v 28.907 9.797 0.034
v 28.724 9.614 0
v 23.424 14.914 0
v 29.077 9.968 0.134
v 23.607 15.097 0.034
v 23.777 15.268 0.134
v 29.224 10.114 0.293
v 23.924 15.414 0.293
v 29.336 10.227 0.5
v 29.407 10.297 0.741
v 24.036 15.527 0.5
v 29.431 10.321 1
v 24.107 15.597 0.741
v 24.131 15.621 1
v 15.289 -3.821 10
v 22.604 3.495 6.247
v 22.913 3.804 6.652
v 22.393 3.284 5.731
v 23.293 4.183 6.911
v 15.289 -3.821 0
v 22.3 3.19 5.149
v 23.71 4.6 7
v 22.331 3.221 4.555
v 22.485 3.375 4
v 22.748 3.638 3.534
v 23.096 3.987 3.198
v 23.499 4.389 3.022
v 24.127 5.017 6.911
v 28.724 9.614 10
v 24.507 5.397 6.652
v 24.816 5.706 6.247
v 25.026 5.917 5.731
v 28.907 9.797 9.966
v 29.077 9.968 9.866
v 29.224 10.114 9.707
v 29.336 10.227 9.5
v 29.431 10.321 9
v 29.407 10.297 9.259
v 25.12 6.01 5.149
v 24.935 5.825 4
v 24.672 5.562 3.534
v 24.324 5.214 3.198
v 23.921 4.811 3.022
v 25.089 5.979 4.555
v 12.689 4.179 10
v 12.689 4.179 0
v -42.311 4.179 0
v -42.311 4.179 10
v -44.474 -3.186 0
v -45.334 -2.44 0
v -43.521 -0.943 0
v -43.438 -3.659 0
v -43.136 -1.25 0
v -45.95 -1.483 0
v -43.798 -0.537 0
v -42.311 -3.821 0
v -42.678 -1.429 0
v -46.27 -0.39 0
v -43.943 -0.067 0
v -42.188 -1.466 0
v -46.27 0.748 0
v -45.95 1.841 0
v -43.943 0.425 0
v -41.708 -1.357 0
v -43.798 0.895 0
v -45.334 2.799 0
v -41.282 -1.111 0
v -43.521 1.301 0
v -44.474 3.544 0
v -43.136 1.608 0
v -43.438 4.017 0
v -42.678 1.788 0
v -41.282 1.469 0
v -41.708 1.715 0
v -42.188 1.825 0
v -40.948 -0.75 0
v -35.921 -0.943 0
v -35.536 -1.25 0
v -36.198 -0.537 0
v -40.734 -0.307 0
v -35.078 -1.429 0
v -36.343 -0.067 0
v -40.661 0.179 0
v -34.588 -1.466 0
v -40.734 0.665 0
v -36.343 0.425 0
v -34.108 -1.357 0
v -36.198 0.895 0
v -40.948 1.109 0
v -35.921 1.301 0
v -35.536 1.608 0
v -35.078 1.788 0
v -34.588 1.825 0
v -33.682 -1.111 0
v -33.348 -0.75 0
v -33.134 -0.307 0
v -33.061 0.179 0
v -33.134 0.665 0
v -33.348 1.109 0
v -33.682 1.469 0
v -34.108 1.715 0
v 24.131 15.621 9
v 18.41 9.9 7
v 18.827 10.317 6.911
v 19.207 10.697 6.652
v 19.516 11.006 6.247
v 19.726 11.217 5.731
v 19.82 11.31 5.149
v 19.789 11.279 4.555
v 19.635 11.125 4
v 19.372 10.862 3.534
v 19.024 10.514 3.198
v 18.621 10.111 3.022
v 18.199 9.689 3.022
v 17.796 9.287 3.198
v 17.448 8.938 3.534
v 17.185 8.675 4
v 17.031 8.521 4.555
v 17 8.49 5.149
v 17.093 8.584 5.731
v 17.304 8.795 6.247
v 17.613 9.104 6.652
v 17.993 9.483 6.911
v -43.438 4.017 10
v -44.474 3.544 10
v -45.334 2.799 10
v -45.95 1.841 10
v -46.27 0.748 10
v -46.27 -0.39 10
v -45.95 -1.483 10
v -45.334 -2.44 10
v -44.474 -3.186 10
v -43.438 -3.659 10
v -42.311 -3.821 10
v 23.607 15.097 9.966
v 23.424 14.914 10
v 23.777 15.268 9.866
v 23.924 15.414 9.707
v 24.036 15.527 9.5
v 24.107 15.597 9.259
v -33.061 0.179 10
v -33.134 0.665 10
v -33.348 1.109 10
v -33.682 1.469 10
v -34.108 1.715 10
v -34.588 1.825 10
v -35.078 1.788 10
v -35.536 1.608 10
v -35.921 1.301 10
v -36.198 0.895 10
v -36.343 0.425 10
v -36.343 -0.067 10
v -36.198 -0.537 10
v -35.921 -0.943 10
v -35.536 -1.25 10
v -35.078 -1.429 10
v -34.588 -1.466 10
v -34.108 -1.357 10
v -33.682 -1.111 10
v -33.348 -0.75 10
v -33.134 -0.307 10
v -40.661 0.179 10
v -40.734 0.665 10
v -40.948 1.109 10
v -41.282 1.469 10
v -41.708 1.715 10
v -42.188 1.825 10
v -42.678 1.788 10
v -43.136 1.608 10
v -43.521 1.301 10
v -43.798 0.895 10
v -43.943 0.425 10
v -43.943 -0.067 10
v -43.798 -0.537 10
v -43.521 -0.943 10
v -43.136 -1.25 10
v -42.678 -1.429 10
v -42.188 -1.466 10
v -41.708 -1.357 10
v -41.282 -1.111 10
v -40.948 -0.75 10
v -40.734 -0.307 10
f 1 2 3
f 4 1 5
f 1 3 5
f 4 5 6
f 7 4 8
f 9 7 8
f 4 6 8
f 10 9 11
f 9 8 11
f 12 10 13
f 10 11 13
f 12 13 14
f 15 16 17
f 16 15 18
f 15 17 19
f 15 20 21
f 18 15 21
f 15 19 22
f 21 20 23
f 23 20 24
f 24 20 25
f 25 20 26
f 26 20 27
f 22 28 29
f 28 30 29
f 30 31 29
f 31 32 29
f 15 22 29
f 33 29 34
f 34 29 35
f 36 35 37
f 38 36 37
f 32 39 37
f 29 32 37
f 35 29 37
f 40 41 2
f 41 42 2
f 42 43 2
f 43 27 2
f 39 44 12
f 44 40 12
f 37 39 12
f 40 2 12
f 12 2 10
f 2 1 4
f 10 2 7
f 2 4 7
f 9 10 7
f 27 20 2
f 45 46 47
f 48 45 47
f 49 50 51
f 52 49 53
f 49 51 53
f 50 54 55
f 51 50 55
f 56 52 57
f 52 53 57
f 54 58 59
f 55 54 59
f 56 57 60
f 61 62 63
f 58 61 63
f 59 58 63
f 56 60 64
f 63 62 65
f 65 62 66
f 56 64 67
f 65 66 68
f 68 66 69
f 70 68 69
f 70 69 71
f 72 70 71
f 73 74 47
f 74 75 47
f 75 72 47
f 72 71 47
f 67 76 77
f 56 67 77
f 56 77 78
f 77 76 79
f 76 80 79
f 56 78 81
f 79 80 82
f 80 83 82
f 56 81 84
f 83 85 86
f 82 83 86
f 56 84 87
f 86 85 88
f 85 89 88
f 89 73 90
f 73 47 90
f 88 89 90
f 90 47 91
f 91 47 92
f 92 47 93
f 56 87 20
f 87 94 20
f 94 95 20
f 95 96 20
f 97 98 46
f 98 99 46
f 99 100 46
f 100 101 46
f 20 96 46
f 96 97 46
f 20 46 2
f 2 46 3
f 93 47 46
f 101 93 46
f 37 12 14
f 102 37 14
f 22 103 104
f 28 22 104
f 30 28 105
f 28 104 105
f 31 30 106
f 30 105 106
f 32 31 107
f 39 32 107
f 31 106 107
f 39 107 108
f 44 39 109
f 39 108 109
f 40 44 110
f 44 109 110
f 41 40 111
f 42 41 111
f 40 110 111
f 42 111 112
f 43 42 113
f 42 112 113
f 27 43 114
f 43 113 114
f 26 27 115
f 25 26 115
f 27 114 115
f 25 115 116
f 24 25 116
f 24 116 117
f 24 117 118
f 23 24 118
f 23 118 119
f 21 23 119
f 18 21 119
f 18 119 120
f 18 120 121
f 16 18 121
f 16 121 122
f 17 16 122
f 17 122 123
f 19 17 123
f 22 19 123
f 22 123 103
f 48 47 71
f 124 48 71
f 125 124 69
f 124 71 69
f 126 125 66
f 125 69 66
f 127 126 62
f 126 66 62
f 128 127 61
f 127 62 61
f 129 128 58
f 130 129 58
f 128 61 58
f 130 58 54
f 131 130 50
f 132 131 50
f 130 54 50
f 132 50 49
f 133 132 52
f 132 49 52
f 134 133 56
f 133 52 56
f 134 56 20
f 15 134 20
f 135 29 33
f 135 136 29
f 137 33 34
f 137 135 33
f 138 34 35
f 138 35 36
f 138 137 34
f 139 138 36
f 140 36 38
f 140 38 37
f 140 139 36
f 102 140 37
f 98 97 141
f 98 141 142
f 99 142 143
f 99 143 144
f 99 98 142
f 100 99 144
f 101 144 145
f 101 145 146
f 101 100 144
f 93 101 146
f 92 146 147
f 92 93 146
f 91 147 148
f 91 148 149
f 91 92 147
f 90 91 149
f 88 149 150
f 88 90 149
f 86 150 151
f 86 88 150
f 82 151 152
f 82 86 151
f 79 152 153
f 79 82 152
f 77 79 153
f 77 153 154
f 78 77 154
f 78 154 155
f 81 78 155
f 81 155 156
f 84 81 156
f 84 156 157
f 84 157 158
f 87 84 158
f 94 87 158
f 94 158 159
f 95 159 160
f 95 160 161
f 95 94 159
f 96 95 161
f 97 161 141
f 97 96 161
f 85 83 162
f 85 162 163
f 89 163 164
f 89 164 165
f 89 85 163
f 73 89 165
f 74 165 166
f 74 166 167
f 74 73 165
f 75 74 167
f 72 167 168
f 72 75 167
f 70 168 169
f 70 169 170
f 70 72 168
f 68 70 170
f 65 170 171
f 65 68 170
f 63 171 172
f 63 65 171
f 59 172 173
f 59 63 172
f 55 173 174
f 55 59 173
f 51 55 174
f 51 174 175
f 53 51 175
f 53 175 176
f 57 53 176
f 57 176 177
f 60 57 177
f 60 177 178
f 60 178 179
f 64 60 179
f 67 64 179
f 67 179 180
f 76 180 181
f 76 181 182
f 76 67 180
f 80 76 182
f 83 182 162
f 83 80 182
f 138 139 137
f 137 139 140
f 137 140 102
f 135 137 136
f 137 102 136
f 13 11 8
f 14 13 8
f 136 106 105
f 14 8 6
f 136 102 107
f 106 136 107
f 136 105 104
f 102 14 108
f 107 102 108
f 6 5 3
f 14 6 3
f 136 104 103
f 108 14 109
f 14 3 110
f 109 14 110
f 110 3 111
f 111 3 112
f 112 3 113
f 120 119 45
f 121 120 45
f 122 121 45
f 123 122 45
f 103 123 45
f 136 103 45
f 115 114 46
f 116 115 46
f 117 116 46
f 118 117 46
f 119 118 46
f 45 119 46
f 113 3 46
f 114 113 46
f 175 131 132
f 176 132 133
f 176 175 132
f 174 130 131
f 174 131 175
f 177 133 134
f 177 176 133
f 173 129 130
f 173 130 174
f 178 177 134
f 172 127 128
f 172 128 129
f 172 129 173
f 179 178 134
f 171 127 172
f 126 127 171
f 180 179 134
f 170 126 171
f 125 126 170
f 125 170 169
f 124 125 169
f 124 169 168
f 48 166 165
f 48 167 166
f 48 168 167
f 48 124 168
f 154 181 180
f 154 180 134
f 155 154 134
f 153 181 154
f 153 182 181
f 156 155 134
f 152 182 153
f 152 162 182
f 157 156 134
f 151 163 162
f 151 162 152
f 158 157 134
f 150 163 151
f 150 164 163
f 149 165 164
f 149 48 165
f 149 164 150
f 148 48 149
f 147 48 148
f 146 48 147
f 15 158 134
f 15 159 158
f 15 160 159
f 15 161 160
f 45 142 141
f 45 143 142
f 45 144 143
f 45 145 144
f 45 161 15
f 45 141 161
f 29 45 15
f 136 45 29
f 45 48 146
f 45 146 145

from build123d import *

# Parameters (mm, degrees)
SKETCH1_R           = 1.65
BOSS_EXTRUDE1_DEPTH = 10
SKETCH2_R           = 2
CUT_EXTRUDE1_DEPTH  = 18.495331881
FILLET1_R           = 1


with BuildPart() as part:
    # Sketch1 → Boss-Extrude1 (new body)
    with BuildSketch(Plane.XY):
        with BuildLine():
            Line((12.688854384, 4.179140788), (-42.311145616, 4.179140788))
            ThreePointArc((-42.311145616, 4.179140788), (-46.311145616, 0.179140788), (-42.311145616, -3.820859212))
            Line((-42.311145616, -3.820859212), (15.288854384, -3.820859212))
            Line((15.288854384, -3.820859212), (29.430990008, 10.321276412))
            Line((29.430990008, 10.321276412), (24.130990008, 15.621276412))
            Line((24.130990008, 15.621276412), (12.688854384, 4.179140788))
        make_face()
        with Locations((-34.711145616, 0.179140788)):
            Circle(SKETCH1_R, mode=Mode.SUBTRACT)
        with Locations((-42.311145616, 0.179140788)):
            Circle(SKETCH1_R, mode=Mode.SUBTRACT)
    extrude(amount=BOSS_EXTRUDE1_DEPTH)

    # Sketch2 → Cut-Extrude1 (cut, through all)
    with BuildSketch(Plane(origin=(4.254856798, -4.254856798, 0), x_dir=(0, 0, 1), z_dir=(-0.707106781, 0.707106781, 0))):
        with Locations((5, 20.018285462)):
            Circle(SKETCH2_R)
    extrude(amount=-CUT_EXTRUDE1_DEPTH, mode=Mode.SUBTRACT)

    # Fillet1
    fillet1_edges = [part.edges().sort_by_distance(p)[0] for p in [
        (26.780990008, 12.971276412, 0),
        (26.780990008, 12.971276412, 10),
    ]]
    fillet(fillet1_edges, radius=FILLET1_R)


solid = part.part
